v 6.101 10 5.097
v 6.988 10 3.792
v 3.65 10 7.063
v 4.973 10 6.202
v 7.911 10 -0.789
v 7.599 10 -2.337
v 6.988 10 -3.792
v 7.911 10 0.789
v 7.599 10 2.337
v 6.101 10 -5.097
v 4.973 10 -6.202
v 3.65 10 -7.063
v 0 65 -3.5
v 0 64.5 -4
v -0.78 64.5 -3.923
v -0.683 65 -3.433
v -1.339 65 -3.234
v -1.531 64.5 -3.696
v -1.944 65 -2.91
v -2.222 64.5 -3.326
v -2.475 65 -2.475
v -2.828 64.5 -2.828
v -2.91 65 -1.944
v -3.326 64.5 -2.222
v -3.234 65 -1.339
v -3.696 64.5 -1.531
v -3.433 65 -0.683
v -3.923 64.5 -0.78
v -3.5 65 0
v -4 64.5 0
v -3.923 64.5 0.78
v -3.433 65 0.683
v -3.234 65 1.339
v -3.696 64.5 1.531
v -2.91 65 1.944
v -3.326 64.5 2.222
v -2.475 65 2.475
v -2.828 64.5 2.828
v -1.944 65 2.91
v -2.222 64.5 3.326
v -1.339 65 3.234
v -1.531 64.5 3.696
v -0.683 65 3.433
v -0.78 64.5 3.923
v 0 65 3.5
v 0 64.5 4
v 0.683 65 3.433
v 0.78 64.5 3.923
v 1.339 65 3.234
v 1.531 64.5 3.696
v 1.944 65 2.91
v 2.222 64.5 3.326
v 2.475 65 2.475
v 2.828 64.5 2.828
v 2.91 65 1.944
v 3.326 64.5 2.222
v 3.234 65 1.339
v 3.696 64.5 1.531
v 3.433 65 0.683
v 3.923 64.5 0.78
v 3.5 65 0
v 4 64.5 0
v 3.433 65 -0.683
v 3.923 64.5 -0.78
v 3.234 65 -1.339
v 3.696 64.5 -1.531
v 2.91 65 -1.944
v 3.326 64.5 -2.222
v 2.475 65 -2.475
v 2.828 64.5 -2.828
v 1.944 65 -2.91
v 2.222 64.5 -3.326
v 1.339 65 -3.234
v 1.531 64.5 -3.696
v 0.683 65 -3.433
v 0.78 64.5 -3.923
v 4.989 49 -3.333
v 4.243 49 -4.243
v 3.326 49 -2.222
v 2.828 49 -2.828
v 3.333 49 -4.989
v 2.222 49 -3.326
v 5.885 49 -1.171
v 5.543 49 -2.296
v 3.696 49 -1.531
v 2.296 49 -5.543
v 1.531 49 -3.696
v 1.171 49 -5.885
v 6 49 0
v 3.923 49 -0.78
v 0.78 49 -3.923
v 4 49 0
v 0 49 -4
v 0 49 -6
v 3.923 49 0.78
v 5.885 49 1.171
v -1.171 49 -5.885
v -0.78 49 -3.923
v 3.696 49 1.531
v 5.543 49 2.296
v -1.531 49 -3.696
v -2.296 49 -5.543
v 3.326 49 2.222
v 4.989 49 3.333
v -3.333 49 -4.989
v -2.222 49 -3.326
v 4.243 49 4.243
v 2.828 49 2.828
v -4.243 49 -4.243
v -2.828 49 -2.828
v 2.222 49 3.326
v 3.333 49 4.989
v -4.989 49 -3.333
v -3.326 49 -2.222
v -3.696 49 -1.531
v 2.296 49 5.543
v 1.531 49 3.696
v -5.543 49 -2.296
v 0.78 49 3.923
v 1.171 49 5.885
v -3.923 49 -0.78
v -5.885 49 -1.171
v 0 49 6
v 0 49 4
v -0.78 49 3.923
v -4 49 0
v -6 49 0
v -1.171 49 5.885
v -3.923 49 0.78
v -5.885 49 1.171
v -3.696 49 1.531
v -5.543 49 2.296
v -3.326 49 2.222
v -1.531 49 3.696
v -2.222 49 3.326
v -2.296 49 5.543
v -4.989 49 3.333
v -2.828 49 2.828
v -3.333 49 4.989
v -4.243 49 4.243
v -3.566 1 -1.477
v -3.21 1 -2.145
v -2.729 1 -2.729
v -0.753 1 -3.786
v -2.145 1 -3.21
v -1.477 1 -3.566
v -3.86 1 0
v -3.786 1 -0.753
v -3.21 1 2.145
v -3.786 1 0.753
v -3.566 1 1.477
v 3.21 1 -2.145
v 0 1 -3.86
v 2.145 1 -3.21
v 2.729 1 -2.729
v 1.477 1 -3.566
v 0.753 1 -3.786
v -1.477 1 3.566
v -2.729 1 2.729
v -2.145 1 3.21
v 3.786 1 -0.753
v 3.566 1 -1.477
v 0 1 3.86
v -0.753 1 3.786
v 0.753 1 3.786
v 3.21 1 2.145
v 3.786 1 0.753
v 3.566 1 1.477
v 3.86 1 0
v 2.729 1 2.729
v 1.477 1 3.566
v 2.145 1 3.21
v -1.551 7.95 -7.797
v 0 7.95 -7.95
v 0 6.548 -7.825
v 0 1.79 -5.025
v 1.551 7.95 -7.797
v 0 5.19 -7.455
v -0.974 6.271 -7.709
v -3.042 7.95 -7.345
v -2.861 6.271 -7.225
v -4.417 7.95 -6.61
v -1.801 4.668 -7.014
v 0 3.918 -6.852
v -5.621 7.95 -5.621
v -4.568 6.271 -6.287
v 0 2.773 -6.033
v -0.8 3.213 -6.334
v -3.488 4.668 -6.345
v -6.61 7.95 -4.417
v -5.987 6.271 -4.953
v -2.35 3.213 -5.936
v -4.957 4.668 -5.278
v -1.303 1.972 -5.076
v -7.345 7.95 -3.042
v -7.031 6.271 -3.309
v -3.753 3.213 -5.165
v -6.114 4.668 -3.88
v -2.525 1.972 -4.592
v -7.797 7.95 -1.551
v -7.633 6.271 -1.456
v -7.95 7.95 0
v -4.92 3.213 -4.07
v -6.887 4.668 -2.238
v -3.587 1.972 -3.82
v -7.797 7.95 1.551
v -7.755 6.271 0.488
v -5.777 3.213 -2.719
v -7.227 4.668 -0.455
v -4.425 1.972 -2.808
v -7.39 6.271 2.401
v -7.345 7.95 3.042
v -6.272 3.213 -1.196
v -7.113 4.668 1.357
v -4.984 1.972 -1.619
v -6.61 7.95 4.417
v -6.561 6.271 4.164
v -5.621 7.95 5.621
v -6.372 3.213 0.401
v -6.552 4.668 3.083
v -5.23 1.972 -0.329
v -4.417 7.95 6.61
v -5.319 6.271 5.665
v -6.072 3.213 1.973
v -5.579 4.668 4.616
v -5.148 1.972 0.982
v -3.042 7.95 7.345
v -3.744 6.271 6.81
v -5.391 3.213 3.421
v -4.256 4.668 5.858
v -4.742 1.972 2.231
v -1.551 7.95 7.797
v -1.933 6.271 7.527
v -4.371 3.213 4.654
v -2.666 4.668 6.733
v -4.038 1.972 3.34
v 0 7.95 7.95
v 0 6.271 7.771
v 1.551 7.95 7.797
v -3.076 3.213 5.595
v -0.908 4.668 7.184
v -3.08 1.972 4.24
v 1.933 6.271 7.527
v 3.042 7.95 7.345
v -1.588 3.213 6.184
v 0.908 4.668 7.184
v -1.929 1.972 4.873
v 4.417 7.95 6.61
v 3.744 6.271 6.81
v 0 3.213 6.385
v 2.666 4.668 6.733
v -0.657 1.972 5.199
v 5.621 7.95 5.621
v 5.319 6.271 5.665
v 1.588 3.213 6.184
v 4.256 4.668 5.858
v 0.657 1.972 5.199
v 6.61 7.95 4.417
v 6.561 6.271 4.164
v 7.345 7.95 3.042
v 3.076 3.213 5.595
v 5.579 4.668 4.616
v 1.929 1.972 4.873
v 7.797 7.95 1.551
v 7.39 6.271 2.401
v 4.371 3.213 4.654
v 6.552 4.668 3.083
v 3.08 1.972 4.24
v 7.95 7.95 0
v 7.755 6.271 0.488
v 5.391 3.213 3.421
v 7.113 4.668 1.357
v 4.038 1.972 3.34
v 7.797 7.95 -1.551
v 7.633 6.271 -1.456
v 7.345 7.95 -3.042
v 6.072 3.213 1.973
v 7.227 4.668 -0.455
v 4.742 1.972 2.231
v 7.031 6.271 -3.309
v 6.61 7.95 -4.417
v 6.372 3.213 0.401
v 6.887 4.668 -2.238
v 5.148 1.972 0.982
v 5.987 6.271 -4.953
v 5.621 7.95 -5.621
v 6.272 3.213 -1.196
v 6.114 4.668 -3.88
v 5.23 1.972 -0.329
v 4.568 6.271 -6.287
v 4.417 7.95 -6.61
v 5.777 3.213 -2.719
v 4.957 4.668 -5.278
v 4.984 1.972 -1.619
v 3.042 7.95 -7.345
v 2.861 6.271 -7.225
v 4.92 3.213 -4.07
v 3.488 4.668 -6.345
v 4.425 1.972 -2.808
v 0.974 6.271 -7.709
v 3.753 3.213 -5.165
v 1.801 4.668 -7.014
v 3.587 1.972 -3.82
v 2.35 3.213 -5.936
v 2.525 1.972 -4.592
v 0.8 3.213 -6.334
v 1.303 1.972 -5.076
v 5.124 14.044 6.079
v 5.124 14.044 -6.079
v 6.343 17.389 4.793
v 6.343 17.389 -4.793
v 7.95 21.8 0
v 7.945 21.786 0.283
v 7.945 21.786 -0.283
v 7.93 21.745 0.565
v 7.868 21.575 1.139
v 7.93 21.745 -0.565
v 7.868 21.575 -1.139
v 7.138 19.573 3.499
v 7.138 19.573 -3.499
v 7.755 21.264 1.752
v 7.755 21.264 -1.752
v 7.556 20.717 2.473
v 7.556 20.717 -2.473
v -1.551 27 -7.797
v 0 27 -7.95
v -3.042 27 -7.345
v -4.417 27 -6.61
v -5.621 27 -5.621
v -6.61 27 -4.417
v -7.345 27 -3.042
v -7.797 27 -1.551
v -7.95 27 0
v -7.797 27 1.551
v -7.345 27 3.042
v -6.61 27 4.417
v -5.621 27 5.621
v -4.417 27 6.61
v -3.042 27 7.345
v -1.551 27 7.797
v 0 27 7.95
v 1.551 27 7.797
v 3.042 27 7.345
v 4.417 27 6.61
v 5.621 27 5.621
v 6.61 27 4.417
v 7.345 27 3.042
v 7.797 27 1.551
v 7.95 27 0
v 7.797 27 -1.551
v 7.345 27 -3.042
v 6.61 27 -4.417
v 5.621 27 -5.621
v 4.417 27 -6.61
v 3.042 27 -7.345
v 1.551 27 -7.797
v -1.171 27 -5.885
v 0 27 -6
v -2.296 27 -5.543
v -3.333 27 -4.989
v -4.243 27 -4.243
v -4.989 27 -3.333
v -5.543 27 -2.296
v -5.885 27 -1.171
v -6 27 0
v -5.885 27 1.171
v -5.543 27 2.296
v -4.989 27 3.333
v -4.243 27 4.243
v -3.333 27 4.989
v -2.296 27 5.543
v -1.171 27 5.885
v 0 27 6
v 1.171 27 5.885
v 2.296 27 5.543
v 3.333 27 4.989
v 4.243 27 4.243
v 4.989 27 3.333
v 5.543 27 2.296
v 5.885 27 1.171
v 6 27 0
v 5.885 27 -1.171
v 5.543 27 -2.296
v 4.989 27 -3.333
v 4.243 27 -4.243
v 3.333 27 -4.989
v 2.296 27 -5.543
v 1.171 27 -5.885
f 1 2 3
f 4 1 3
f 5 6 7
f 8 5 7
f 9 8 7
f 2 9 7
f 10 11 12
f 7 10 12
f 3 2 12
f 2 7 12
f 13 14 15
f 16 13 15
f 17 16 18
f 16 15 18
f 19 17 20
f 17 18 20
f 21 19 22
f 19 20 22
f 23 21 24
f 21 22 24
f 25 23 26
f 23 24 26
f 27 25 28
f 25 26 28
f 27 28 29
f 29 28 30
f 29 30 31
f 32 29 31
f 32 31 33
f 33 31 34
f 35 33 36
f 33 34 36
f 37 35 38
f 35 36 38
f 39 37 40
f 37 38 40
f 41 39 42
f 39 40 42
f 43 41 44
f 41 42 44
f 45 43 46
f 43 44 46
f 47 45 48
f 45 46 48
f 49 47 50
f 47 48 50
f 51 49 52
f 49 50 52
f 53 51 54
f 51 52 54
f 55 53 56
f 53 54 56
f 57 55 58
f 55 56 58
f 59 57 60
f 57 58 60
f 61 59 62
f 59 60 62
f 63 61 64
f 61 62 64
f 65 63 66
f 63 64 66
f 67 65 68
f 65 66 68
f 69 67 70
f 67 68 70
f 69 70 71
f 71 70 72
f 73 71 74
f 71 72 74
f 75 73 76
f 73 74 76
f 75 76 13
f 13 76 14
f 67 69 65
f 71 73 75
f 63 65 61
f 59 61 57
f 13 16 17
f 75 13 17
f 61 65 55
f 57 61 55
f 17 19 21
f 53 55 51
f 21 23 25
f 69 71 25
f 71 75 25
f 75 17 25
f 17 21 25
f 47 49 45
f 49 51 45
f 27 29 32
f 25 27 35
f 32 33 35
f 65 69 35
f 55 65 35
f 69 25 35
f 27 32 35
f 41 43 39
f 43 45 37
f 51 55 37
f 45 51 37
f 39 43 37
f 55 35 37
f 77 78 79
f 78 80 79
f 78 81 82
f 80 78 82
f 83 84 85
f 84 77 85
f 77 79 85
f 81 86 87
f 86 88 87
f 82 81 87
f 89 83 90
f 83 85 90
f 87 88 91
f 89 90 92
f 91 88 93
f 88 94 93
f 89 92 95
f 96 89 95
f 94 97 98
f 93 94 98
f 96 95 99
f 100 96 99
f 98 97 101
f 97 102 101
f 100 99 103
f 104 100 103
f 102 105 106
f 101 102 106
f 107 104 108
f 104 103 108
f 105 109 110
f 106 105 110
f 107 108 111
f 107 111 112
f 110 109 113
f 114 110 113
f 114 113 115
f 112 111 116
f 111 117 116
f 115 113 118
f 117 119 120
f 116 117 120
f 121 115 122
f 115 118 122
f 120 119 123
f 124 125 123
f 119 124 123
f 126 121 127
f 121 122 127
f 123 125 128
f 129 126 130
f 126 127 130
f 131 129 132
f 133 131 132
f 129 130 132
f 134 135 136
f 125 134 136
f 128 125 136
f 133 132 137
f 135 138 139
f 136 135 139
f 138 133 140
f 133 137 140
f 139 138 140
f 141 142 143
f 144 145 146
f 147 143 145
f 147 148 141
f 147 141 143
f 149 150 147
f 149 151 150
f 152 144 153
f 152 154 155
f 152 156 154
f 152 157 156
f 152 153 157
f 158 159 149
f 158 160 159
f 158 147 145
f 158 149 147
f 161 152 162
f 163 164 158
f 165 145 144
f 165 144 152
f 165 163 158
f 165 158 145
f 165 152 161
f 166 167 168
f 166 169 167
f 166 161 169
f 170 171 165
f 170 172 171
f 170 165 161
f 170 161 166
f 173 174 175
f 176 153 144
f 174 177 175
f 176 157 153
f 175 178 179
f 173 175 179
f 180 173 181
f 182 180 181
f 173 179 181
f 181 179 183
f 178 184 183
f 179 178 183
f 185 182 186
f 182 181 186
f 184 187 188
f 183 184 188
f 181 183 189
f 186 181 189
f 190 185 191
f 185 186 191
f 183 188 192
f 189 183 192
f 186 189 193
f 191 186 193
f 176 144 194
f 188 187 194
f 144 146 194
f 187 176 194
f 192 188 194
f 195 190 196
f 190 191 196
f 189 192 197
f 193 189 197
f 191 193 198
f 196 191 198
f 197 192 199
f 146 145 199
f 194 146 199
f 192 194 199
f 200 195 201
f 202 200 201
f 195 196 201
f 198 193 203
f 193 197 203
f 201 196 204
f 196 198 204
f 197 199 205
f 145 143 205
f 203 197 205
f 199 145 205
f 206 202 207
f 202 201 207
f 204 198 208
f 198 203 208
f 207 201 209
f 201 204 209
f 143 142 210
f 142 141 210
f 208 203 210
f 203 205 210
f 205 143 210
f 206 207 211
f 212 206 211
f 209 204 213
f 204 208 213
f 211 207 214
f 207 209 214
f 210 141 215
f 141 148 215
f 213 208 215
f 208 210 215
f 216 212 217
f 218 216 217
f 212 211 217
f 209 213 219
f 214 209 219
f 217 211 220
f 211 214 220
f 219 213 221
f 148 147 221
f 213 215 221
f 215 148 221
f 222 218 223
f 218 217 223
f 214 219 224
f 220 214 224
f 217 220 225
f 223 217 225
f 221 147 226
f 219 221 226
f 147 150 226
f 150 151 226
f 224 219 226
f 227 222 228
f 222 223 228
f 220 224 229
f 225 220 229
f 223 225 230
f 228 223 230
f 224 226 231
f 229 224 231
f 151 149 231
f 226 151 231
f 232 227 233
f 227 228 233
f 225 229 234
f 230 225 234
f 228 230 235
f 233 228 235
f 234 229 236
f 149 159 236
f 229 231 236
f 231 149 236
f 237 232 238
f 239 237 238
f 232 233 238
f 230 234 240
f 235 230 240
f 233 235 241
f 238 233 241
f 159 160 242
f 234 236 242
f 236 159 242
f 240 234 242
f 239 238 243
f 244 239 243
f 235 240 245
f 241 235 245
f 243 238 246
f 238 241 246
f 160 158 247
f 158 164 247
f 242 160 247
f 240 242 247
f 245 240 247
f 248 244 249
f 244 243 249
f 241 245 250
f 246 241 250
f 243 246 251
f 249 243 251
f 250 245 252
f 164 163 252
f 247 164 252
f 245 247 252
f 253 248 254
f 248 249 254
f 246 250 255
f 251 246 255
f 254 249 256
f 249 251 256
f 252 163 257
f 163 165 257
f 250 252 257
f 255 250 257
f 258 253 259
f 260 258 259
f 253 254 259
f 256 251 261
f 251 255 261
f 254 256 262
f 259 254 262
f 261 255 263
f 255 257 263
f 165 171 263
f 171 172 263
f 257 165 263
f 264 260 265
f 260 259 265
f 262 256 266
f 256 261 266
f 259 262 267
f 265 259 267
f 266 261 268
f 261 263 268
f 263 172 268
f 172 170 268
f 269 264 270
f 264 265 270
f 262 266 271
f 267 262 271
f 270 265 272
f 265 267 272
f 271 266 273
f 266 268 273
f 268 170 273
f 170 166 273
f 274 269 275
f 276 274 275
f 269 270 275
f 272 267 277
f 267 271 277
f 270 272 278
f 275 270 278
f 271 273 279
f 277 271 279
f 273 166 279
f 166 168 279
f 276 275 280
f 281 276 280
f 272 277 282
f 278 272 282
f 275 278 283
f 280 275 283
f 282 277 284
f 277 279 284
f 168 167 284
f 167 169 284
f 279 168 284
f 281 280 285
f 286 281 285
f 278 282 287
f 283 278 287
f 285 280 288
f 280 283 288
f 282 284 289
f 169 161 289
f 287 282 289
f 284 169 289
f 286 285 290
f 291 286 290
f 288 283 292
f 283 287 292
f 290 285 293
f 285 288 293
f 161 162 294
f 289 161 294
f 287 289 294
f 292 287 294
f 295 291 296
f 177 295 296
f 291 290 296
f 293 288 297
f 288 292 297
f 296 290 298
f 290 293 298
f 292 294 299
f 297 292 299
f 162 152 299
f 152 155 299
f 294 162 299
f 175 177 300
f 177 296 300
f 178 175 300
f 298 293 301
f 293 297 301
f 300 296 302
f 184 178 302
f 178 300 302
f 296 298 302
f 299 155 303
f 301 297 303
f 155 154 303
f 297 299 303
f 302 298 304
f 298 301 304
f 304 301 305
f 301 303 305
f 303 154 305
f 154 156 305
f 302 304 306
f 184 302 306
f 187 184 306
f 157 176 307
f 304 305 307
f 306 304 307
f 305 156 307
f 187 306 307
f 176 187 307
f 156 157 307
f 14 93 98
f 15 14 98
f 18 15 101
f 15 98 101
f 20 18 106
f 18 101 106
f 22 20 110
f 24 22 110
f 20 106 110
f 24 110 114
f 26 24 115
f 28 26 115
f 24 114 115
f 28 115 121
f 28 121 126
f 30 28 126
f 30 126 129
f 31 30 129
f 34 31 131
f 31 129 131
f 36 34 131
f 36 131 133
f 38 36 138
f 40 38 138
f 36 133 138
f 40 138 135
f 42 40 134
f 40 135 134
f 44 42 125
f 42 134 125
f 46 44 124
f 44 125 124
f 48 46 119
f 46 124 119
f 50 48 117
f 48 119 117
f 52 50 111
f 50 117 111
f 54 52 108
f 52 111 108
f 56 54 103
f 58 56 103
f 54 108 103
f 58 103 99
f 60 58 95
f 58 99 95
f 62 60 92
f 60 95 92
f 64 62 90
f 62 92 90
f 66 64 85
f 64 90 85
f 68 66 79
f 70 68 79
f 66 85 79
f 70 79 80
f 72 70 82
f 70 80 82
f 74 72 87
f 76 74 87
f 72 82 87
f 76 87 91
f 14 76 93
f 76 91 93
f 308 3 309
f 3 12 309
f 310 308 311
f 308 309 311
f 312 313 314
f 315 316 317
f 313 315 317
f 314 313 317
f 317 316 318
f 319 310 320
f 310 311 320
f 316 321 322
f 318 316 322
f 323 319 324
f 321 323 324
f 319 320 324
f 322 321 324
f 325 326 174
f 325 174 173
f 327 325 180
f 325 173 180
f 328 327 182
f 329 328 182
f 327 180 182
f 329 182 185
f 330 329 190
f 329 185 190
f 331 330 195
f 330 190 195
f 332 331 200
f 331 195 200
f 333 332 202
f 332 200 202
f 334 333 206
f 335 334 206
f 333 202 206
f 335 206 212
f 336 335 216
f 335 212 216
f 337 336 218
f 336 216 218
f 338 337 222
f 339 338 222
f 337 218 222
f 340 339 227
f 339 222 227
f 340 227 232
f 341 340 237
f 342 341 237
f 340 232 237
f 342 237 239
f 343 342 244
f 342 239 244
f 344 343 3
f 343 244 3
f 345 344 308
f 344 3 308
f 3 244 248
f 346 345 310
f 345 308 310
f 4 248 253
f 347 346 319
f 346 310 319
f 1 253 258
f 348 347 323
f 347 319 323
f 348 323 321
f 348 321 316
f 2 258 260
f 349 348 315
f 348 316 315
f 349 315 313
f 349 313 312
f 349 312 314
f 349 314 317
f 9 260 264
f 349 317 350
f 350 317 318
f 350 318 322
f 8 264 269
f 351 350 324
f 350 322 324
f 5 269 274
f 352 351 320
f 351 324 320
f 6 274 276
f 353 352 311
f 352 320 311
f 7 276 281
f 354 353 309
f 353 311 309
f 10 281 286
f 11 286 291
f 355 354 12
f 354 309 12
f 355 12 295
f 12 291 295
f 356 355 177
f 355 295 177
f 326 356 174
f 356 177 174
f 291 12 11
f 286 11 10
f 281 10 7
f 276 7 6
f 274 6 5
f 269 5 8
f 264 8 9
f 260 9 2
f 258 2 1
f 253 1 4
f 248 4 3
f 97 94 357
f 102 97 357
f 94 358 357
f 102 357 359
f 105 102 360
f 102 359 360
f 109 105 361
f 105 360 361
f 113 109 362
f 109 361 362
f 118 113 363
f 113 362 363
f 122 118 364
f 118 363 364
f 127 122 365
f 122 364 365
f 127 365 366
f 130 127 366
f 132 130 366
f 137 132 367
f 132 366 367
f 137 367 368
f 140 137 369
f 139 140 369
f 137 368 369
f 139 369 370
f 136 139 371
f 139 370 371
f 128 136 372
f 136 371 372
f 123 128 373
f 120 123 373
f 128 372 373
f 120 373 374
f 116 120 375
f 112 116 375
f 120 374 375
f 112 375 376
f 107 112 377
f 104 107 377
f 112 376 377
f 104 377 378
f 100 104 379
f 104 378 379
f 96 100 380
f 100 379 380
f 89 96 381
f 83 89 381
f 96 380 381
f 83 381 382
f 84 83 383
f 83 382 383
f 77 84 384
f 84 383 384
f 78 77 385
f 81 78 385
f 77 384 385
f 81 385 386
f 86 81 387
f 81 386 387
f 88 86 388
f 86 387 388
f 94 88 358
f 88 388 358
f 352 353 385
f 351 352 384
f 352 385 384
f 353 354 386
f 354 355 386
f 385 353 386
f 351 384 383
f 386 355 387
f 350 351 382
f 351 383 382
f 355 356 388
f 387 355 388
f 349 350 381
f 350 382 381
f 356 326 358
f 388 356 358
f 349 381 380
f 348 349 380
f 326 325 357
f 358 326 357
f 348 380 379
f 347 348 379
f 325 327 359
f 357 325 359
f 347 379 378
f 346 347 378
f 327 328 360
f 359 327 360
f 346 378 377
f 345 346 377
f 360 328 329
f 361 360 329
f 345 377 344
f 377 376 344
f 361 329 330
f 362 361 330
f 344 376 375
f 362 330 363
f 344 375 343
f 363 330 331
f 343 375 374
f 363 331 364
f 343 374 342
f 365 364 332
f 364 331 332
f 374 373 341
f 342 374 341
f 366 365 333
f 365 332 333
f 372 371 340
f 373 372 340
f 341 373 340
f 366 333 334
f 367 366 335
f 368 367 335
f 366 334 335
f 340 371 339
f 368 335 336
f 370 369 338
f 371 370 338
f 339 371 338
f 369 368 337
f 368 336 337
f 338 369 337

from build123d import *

# Parameters (mm, degrees)
CHANFREIN1_SIZE              = 0.5
ENL_V_MAT_EXTRU_1_DEPTH      = 8.95
ENL_V_MAT_EXTRU_1_DEPTH_BACK = 8.95


with BuildPart() as part:
    # Esquisse1 → Base-Révolution (revolve)
    with BuildSketch(Plane.XY, mode=Mode.PRIVATE) as base_r_volution_sk:
        with BuildLine():
            Line((0, 65), (4, 65))
            Line((4, 65), (4, 49))
            Line((4, 49), (6, 49))
            Line((6, 49), (6, 27))
            Line((6, 27), (7.95, 27))
            Line((7.95, 27), (7.95, 7.95))
            ThreePointArc((7.95, 7.95), (5.62149891, 2.32850109), (0, 0))
            Line((0, 0), (0, 65))
        make_face()
    revolve(base_r_volution_sk.sketch.rotate(Axis((0, -9.281443849, 0), (0, 1, 0)), 90), axis=Axis((0, -9.281443849, 0), (0, 1, 0)))  # turned: the seam where the file's is

    # Chanfrein1
    chanfrein1_edges = [part.edges().sort_by_distance(p)[0] for p in [
        (0, 65, 4),
    ]]
    chamfer(chanfrein1_edges, length=CHANFREIN1_SIZE)

    # Esquisse2 → Enlèv. mat.-Extru.1 (cut, two sides)
    with BuildSketch(Plane.XY) as enl_v_mat_extru_1_sk:
        Polygon((14.617538198, 1), (14.617538198, 10), (3.65, 10), (7.95, 21.8), (23.946768439, 21.8), (23.946768439, -11.083879123), (-11.532407151, -11.083879123), (-11.532407151, 1), align=None)
    extrude(amount=ENL_V_MAT_EXTRU_1_DEPTH, mode=Mode.SUBTRACT)
    extrude(enl_v_mat_extru_1_sk.sketch, amount=-ENL_V_MAT_EXTRU_1_DEPTH_BACK, mode=Mode.SUBTRACT)


solid = part.part
